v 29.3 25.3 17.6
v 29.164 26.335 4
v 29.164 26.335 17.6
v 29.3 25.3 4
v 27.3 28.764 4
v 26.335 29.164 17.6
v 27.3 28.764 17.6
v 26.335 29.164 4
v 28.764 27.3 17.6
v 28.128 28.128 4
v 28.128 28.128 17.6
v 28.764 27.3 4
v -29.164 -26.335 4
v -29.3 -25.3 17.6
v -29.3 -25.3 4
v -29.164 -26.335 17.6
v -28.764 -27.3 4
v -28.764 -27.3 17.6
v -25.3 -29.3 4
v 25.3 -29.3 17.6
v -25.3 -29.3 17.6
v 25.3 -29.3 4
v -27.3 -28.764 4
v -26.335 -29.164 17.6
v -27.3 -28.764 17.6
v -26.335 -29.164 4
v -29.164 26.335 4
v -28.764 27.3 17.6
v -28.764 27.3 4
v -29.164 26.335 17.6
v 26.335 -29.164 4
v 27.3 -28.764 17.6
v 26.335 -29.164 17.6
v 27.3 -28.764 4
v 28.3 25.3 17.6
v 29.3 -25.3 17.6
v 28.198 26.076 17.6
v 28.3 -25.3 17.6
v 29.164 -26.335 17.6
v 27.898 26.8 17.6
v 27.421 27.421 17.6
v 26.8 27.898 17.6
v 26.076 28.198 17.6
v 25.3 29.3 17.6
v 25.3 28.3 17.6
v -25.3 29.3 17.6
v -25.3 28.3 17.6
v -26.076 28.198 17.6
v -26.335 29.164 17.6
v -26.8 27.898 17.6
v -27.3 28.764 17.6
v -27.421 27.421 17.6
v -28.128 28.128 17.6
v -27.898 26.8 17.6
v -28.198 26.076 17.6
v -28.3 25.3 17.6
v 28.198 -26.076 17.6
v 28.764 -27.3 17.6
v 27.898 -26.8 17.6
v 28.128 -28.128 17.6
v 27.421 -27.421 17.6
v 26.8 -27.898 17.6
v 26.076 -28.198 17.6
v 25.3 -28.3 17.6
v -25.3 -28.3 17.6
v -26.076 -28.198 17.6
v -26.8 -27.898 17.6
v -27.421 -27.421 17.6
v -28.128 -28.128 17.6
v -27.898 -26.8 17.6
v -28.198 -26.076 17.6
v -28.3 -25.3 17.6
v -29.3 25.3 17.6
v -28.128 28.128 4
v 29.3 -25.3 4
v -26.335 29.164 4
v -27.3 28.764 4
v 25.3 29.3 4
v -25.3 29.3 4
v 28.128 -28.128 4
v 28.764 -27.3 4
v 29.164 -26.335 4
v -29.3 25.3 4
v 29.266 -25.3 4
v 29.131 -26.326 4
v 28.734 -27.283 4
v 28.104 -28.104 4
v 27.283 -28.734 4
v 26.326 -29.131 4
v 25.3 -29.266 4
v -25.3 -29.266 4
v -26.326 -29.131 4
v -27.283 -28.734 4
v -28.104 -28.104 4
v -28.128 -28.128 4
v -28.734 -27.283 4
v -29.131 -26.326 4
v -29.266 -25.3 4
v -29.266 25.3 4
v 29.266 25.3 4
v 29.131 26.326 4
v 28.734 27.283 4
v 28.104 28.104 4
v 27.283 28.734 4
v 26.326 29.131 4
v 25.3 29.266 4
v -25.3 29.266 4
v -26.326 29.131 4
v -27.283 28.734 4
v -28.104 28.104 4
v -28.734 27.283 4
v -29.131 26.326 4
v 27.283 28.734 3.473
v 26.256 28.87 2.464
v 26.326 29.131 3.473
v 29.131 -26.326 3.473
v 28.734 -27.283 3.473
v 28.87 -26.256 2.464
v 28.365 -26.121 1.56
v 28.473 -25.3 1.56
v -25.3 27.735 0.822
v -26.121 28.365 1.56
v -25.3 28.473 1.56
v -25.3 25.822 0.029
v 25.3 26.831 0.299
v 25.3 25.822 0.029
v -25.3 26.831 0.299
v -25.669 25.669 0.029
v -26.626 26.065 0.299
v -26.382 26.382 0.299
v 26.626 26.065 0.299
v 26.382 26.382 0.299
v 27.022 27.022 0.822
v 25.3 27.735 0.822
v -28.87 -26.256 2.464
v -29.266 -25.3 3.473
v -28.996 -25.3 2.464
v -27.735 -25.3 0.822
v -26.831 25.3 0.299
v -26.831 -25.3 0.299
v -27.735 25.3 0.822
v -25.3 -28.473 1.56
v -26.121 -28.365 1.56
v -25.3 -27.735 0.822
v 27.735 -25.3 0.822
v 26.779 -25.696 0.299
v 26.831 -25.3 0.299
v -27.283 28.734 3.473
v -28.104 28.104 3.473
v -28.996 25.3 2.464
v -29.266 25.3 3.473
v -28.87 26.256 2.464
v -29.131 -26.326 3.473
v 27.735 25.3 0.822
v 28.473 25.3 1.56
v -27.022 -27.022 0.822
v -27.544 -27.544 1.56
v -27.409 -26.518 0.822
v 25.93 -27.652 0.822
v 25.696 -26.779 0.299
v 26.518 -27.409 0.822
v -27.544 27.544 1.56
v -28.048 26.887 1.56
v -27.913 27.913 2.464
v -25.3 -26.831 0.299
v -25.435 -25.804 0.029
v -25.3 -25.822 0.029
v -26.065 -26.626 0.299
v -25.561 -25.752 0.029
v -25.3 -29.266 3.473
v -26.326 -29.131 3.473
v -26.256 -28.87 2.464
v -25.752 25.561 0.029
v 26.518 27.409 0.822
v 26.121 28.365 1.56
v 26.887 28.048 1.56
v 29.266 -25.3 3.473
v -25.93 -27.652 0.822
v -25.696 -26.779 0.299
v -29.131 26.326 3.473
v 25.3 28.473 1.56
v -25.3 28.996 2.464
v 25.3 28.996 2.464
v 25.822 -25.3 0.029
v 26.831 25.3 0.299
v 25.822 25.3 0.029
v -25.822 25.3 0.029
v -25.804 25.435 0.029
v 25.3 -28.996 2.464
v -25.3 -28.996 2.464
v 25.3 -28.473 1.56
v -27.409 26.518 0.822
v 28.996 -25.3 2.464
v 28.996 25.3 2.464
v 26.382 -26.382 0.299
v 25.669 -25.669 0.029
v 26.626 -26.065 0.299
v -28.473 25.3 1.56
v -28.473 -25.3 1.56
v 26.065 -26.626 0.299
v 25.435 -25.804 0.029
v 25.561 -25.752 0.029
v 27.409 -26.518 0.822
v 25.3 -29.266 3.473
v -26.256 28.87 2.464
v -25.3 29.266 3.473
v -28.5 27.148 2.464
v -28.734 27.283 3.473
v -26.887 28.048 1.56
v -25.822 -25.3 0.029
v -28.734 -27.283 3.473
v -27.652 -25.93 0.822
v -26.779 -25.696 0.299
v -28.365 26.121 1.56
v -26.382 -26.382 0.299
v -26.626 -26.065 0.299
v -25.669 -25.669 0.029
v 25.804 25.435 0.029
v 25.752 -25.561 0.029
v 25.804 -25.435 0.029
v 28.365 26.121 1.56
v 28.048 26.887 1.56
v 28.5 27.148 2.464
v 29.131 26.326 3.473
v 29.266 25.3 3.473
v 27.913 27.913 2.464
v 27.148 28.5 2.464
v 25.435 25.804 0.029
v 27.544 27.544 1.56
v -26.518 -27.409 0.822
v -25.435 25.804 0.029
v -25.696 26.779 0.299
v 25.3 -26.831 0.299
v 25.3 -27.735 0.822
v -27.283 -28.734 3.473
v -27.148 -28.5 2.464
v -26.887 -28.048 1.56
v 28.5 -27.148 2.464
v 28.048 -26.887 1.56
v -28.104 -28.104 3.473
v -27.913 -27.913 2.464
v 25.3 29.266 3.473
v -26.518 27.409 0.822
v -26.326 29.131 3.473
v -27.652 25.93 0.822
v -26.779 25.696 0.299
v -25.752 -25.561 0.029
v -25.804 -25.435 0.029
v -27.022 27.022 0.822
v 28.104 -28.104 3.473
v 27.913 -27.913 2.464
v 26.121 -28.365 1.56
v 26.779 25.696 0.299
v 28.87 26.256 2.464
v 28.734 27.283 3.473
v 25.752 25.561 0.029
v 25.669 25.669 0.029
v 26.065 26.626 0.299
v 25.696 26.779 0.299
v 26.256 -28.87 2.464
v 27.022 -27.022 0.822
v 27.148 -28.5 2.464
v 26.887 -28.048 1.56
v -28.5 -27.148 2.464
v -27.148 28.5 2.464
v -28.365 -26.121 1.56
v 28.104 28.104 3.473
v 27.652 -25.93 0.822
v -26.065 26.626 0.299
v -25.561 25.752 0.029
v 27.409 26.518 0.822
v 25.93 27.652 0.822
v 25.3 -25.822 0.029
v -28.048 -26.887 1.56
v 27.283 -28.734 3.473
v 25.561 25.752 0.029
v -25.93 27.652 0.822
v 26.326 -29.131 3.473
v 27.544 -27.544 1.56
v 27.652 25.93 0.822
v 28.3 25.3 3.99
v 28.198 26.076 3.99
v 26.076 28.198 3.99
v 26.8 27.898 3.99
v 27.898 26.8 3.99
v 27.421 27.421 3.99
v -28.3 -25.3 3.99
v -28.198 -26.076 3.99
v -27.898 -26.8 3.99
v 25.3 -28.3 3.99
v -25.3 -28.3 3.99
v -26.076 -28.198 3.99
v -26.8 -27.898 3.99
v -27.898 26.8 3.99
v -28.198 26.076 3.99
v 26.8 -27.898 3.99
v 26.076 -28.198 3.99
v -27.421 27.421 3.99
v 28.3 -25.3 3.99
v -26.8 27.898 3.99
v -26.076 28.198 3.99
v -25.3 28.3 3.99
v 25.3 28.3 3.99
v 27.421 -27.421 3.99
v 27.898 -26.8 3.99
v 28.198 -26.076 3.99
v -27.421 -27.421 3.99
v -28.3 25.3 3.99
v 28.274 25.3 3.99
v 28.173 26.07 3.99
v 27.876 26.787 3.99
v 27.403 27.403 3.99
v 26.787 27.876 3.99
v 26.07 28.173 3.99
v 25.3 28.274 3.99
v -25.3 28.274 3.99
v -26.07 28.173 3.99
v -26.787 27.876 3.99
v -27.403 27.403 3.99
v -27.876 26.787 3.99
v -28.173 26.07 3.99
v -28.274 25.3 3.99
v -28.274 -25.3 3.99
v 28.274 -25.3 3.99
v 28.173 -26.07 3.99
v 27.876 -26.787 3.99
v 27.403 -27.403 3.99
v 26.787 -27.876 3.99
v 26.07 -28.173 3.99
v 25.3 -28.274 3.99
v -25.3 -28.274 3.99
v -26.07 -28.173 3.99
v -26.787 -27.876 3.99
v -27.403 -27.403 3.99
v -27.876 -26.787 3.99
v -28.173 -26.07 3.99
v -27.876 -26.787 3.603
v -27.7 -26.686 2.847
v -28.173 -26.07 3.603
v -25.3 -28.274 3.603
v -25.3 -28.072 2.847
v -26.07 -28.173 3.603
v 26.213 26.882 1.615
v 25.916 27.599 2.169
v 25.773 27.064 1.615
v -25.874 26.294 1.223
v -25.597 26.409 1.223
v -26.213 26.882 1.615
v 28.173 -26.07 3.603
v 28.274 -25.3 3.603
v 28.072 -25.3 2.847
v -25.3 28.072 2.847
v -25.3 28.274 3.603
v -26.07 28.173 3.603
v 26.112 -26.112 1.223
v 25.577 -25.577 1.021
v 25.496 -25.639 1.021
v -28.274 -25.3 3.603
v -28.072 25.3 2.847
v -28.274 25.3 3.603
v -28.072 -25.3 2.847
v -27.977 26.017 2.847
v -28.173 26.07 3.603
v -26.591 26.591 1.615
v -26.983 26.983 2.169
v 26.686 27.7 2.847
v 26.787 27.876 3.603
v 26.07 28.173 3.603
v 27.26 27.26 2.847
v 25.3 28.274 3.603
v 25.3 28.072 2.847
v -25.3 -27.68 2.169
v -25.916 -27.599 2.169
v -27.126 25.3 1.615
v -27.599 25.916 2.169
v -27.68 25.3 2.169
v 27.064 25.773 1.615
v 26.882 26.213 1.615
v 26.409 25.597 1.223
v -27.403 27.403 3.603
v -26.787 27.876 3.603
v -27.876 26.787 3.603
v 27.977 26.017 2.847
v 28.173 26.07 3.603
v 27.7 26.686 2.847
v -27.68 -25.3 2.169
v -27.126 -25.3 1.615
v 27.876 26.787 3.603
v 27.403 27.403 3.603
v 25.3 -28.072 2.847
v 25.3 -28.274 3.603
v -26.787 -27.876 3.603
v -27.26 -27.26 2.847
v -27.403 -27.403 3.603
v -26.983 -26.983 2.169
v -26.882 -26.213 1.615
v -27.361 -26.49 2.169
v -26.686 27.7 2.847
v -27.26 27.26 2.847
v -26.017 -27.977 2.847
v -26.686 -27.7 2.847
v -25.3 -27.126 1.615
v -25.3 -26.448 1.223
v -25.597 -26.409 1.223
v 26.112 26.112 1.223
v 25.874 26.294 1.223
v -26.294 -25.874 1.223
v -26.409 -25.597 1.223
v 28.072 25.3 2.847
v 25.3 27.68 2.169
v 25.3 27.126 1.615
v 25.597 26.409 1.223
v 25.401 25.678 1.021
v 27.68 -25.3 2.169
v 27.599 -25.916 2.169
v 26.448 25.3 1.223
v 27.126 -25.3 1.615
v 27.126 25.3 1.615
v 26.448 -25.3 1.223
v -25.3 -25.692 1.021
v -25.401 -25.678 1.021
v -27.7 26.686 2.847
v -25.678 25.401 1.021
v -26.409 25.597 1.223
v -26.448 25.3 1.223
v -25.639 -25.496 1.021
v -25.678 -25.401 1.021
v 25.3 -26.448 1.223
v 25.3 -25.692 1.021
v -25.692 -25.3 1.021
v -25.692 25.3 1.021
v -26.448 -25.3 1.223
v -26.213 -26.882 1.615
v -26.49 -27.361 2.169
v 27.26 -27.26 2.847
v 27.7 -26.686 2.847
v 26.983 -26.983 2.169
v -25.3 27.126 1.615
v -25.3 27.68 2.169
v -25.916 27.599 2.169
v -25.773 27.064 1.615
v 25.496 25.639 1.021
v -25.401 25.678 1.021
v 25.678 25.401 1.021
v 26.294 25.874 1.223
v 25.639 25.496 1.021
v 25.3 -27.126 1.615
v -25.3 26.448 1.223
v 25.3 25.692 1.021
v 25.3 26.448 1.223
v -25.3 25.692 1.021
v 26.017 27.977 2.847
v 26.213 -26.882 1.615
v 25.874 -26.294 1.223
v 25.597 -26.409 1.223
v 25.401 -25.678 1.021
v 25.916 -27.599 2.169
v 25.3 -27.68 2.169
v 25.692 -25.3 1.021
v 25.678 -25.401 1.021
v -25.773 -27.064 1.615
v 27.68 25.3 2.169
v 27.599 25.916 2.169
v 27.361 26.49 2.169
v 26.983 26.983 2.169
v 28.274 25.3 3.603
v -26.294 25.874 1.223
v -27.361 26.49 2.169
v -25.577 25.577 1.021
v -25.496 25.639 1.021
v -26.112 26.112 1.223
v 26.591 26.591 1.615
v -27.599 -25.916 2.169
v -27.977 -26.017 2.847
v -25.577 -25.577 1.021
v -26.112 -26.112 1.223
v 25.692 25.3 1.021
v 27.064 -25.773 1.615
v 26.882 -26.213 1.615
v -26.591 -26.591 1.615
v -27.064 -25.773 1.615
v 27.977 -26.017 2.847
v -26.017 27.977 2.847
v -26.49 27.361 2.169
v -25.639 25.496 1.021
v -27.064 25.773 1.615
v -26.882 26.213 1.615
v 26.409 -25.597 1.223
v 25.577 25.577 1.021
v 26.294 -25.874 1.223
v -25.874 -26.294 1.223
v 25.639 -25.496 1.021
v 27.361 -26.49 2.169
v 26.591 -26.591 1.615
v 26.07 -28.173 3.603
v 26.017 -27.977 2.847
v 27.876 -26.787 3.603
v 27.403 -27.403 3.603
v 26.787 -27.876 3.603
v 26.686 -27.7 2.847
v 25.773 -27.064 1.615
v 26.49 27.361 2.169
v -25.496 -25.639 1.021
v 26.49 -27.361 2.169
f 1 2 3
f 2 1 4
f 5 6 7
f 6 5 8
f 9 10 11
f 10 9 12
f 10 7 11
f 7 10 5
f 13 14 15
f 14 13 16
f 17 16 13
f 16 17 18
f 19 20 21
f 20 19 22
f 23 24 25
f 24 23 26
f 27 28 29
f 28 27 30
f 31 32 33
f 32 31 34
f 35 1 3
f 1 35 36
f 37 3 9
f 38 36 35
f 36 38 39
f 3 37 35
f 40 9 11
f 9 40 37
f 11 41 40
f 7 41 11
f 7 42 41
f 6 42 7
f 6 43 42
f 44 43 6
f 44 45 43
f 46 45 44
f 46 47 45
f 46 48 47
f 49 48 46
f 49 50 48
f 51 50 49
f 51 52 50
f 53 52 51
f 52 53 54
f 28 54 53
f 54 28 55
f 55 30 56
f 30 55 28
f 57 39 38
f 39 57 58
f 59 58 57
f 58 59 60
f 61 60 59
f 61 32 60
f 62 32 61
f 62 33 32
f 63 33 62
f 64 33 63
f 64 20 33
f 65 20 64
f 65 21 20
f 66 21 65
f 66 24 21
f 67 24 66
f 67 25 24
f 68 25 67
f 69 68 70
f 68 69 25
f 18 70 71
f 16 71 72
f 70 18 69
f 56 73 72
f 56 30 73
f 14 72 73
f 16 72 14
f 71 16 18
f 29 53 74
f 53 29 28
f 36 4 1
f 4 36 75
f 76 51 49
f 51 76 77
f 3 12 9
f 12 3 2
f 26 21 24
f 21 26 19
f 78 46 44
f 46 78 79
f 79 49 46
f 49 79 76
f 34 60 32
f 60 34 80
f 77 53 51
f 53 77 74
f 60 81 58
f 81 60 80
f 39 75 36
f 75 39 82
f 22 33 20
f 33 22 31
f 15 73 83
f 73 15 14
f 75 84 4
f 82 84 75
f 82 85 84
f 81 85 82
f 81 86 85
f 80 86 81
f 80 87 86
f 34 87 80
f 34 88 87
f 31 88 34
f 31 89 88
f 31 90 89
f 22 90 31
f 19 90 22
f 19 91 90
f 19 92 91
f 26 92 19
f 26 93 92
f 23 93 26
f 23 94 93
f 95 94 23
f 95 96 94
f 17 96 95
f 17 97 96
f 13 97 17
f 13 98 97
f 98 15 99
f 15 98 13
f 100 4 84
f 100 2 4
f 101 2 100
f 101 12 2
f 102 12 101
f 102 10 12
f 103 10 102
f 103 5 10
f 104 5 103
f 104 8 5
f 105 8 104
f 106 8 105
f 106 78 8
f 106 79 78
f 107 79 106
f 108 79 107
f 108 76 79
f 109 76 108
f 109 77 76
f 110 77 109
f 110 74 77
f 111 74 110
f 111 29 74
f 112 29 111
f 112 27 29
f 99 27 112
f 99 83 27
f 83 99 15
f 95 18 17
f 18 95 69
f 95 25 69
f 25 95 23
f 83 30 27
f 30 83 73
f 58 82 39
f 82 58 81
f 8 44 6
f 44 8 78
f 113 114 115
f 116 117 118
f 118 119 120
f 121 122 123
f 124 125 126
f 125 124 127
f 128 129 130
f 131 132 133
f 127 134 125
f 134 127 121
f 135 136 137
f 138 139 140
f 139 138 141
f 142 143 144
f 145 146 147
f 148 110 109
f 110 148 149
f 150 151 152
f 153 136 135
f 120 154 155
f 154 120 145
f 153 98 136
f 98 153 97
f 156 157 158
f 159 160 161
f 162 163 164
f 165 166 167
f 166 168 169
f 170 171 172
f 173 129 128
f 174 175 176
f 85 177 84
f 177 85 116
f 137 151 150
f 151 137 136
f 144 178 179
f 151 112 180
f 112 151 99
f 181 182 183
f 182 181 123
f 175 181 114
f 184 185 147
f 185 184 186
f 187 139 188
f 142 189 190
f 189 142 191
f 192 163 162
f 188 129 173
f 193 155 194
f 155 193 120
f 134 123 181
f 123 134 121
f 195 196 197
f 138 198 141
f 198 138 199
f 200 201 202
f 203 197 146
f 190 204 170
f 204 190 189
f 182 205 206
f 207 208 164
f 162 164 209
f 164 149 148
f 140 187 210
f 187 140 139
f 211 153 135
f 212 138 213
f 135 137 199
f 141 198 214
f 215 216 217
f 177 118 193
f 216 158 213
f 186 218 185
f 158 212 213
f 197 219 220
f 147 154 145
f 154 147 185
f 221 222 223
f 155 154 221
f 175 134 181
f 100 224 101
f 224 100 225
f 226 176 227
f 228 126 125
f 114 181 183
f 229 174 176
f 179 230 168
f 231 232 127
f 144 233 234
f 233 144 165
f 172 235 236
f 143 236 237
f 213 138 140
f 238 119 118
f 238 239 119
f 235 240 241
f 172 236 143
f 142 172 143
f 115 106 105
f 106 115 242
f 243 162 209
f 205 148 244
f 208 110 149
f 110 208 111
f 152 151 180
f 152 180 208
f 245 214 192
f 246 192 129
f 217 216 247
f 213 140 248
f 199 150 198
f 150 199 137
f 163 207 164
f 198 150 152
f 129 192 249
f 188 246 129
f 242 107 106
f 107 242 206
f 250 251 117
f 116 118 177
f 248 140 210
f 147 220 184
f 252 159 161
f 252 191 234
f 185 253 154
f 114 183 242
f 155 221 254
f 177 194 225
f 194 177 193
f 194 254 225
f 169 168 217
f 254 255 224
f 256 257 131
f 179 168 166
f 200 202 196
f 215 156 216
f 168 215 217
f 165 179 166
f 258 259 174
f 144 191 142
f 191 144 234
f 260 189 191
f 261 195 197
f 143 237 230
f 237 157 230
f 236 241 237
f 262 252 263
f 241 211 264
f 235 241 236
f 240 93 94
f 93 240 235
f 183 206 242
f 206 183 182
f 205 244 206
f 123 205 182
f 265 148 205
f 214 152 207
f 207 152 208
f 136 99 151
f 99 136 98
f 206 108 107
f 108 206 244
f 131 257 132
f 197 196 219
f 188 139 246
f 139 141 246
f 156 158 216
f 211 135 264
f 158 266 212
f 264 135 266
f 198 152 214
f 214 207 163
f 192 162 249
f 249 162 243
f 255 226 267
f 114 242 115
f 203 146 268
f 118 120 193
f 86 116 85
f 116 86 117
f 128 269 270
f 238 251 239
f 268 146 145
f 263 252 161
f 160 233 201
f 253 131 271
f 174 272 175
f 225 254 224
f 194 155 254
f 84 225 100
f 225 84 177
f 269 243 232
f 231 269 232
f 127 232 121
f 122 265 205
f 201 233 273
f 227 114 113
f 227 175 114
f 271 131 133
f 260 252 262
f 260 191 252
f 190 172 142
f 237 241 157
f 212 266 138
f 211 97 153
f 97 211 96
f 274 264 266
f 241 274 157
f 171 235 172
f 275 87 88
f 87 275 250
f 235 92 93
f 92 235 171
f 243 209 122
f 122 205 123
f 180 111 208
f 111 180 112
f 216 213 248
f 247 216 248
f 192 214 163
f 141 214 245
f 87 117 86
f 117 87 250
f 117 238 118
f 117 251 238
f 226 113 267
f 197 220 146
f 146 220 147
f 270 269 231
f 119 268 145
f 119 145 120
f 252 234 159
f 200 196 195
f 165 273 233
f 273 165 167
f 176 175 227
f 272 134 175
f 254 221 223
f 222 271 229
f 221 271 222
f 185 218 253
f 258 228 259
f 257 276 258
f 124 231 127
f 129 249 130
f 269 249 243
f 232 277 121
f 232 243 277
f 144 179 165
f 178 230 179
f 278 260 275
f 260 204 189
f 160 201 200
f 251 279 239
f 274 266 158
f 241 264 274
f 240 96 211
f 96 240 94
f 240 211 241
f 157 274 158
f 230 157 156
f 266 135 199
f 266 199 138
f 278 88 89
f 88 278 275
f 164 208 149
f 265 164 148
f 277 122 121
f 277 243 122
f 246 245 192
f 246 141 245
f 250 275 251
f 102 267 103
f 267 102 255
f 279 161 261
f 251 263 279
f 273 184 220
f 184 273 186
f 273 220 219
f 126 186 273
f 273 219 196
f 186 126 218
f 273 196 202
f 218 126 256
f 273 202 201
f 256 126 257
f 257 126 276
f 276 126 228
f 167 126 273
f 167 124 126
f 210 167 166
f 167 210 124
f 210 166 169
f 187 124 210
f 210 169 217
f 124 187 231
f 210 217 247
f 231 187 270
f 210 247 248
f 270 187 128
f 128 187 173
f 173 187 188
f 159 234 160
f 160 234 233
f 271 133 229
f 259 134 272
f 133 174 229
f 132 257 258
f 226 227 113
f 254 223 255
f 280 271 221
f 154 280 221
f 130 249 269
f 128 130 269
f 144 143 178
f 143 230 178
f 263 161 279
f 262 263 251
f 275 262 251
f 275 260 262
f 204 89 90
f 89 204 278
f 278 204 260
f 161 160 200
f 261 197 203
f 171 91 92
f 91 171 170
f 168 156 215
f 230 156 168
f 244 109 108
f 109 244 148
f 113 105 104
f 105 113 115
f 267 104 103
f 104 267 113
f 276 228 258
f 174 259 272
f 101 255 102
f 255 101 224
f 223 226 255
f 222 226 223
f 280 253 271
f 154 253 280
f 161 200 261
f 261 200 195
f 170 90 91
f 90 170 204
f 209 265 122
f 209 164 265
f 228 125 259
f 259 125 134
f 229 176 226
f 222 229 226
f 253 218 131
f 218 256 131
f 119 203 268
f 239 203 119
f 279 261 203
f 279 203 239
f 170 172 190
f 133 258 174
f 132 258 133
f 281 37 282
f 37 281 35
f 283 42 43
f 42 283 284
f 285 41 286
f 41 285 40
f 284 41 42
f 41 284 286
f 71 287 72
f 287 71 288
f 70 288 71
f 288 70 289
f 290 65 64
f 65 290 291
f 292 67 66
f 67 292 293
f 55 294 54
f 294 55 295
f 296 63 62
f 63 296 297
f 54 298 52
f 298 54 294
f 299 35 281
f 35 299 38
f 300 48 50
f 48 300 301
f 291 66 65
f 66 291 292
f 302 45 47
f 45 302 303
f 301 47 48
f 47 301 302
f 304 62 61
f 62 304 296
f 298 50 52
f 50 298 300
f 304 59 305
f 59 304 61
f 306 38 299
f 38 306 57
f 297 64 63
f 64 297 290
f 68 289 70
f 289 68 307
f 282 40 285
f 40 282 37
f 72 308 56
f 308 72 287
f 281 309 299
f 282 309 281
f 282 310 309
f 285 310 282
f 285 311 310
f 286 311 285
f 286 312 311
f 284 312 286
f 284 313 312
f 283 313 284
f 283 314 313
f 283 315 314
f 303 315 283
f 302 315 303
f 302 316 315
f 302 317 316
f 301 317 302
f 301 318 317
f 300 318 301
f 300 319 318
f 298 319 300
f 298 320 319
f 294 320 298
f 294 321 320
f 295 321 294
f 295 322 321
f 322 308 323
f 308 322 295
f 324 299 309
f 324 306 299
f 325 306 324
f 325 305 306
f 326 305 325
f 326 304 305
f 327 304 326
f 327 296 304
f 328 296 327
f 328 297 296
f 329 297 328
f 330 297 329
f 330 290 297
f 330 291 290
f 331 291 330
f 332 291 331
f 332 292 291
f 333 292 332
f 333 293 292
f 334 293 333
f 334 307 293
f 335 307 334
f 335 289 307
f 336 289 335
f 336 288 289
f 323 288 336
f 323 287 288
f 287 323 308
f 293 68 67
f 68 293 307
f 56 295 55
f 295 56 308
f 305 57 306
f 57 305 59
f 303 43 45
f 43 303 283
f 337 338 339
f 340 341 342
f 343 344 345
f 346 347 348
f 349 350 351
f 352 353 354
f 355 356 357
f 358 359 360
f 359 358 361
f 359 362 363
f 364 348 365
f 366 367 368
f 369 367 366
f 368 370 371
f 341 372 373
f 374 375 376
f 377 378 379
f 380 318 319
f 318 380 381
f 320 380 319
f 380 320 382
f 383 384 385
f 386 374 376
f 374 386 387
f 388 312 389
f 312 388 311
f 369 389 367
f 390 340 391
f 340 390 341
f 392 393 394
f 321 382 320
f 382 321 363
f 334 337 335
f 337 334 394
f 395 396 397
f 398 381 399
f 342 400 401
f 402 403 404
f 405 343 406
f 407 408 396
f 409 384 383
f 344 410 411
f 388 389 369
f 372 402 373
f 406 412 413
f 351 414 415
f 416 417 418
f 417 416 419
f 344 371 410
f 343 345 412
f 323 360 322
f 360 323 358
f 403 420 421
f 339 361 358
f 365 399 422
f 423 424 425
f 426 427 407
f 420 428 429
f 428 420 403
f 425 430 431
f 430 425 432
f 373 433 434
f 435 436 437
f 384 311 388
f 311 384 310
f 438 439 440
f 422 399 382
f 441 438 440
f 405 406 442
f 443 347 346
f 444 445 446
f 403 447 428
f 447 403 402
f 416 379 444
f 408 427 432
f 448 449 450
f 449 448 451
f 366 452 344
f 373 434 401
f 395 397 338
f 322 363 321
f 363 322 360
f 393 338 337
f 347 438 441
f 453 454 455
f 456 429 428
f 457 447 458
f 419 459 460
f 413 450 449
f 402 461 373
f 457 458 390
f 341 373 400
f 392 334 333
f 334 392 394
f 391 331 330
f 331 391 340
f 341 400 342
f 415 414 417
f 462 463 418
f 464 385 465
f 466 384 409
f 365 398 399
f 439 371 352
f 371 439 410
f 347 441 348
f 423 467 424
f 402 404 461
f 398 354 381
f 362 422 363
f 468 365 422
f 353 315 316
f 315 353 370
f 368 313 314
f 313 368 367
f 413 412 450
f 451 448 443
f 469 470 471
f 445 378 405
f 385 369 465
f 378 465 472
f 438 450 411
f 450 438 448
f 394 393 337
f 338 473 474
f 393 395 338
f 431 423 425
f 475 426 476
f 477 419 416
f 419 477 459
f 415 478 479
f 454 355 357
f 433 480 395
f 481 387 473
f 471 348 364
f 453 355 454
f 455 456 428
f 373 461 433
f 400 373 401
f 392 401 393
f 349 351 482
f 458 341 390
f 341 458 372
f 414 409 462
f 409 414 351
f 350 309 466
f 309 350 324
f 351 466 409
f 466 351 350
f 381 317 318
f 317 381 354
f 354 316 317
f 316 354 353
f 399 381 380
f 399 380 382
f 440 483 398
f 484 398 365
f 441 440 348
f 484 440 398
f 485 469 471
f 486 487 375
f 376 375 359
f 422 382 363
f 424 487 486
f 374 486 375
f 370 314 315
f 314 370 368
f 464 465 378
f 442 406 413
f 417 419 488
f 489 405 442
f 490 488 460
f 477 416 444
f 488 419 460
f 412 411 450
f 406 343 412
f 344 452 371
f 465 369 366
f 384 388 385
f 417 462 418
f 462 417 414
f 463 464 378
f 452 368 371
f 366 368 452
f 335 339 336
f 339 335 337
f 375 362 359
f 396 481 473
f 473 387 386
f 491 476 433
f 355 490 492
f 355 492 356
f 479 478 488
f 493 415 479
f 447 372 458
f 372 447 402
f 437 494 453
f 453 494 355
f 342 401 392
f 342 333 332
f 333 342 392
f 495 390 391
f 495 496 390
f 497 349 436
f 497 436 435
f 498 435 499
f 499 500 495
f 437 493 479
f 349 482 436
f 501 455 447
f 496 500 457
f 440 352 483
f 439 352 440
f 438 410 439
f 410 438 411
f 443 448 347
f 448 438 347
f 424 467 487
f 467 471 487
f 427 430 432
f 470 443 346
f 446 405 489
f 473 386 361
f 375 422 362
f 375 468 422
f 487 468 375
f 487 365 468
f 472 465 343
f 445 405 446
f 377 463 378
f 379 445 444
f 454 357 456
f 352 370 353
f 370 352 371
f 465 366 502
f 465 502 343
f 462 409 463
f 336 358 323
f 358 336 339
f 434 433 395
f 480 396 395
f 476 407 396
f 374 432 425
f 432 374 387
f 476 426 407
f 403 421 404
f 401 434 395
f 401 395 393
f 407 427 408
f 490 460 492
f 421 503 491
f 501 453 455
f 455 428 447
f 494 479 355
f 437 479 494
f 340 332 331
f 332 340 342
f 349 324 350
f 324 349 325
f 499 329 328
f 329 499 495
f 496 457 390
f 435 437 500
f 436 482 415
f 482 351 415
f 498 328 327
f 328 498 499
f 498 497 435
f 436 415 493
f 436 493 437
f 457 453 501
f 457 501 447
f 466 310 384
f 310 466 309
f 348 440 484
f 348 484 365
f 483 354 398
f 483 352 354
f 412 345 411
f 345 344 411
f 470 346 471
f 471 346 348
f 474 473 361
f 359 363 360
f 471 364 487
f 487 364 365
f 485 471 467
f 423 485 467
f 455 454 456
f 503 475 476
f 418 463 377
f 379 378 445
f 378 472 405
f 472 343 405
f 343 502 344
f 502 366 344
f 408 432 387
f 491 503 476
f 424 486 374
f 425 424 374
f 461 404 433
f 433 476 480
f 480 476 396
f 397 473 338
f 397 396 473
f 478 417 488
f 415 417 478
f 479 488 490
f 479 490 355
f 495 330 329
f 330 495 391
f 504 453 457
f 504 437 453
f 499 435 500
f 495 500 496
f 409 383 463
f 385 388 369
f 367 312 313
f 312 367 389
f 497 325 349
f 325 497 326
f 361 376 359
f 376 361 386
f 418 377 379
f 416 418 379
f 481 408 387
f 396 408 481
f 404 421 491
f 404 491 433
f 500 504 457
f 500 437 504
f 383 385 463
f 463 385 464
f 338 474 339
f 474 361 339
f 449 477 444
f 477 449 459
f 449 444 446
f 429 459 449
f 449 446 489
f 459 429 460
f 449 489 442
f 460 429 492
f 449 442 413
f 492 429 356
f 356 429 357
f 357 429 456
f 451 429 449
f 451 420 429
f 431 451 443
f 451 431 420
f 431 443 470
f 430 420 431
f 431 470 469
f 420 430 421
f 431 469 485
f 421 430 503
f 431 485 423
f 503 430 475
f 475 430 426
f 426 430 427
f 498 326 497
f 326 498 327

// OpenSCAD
// Customizable Ultimate Drawer System Inserts
// Remixed from MarcElbichon's Ultimate Drawer System https://www.thingiverse.com/thing:2302575 (CC-BY 4.0)
// Copyright (C) 2019 by Brian Alano (and possibly others)
// Licensed under the Creative Commons Attribution-NonCommercial-ShareAlike 4.0 (CC-BY-NC-SA 4.0)

/* Design notes
// width is x dimension, across the face of the drawer
// depth is y dimension, front to back of the drawer
// height is z dimension
*/

/* Coding Style Guide 
 * User parameters and modules use underscores between words.
 * Other variable names use camel case.
 * Separate features into their own modules if they are more than a couple lines long.
 * All dimensions should be assigned to variables, usually global ones so they can be found easily.
 * Keep local modules local.
 * Keep local variables local.
 * Maintain Thingiverse Customizer compatibility.
 * Maintain backwards compatibility with MarcElbichon's Ultimate Drawer System 
   (https://www.thingiverse.com/thing:2302575). This means a 1Ux1Ux1U drawer 
   made with this program will work in MarcElbichon's shelf. 
   
   See README.md for more.
*/

/* [Size] */
// Outside width in mm (1U drawer is 118 mm inside, 1.5U is 182.5 mm, 2U is 249 mm)
Width=59; // [8:0.5:249]
// Outside depth in mm (1U drawer is 118 mm inside, 1.5U is 182 mm, 2U is 248 mm)
Depth=59; // [8:248]
// Outside height in mm (1U drawer is 18 mm inside, 2U is 38 mm, 3U is 58 mm, etc.)
Height= 18; // [8:398]
// This amount is subtracted from each of the six sides to provide some wiggle room. Half your nozzle diameter is a good place to start if you're not sure.
Tolerance=0.2; // [0.00:0.02:1.00]

/* [Hidden] */
drawerWallThickness = 1; // assumed
drawerCornerRadius = 4; // assumed
insertWallThickness = 1;
insertCornerRadius = drawerCornerRadius; 
insertSize = [Width - Tolerance*2, Depth - Tolerance*2, Height - Tolerance*2];

// utility variables
epsilon = 0.01;
$fn=24;

module insert() {
    module add() {
        // main body
       translate([0, 0, insertCornerRadius])
            linear_extrude(insertSize.z - insertCornerRadius)
            roundtangle([insertSize.x, insertSize.y], radius=insertCornerRadius);
        // filleted bottom
       translate([0, 0, insertCornerRadius])
            roundtangle3d([insertSize.x, insertSize.y], insertCornerRadius);
    }
    
    module subtract() {
        insideRadius = insertCornerRadius - insertWallThickness;
        // main cut, minus fillets
        cut = [insertSize.x - insertWallThickness*2, 
            insertSize.y - insertWallThickness*2, 
            insertSize.z - insertWallThickness];
        translate([0, 0, insideRadius + insertWallThickness - epsilon]) 
            linear_extrude(cut.z - insideRadius + epsilon * 2) 
            roundtangle([cut.x, cut.y], insideRadius );
        // fillet cut
       translate([0, 0, insideRadius + insertWallThickness]) 
            roundtangle3d([cut.x, cut.y], insideRadius);
    }
     
    difference() {
        add();  
        subtract();
    }
}

module roundtangle(size, radius) {
    minkowski() {
        square([max(size.x - radius*2, epsilon), max(size.y - radius*2, epsilon)], center=true);
        circle(r=radius);
    }
}

module roundtangle3d(size, r) {
    minkowski() {
        cube([max(size.x - r*2, epsilon), max(size.y - r*2, epsilon), epsilon], center=true);
        sphere(r=r );
    }
}
    
insert();
